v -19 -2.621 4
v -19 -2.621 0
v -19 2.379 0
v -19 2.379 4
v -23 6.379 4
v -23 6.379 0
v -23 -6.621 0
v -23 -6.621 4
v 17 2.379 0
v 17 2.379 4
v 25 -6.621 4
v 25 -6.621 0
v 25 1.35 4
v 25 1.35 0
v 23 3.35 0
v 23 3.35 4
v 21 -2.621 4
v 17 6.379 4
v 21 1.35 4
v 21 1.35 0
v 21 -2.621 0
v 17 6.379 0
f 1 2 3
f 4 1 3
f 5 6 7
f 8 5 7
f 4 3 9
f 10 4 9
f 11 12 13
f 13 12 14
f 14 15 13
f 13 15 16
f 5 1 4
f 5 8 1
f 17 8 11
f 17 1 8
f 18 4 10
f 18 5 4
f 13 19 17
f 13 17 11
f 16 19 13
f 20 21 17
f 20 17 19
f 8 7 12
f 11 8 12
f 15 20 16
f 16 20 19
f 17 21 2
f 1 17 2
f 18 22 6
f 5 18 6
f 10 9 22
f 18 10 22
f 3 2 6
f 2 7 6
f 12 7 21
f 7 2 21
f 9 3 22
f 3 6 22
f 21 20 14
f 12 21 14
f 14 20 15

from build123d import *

# Parameters (mm, degrees)
F0_W     = 4
F0_H     = 5
F0_H_2   = 5.9711672319
F1_DEPTH = 4
F2_SIZE  = 1.99999


# Not quite as in the source:
# - a fillet or chamfer is up to 0.001 mm smaller than in the source, because OpenCascade refuses the exact size


with BuildPart() as f1:
    # F0 (on Top) → F1 (new body)
    with BuildSketch(Plane.XY):
        with Locations((-21, -0.121395904)):
            Rectangle(F0_W, F0_H)
        Polygon((-19, -2.621395904), (-23, -2.621395904), (-23, -6.621395904), (25, -6.621395904), (25, -2.621395904), (21, -2.621395904), align=None)
        Polygon((-23, 6.378604096), (-23, 2.378604096), (-19, 2.378604096), (17, 2.378604096), (17, 6.378604096), align=None)
        with Locations((23, 0.364187712)):
            Rectangle(F0_W, F0_H_2)
    extrude(amount=F1_DEPTH)

    # F2 (size 2 in the source; OpenCascade refuses exactly that, so slightly less here)
    f2_edges = [f1.edges().sort_by_distance(p)[0] for p in [
        (21, 3.349771, 2),
        (25, 3.349771, 2),
    ]]
    chamfer(f2_edges, length=F2_SIZE)


solid = f1.part
